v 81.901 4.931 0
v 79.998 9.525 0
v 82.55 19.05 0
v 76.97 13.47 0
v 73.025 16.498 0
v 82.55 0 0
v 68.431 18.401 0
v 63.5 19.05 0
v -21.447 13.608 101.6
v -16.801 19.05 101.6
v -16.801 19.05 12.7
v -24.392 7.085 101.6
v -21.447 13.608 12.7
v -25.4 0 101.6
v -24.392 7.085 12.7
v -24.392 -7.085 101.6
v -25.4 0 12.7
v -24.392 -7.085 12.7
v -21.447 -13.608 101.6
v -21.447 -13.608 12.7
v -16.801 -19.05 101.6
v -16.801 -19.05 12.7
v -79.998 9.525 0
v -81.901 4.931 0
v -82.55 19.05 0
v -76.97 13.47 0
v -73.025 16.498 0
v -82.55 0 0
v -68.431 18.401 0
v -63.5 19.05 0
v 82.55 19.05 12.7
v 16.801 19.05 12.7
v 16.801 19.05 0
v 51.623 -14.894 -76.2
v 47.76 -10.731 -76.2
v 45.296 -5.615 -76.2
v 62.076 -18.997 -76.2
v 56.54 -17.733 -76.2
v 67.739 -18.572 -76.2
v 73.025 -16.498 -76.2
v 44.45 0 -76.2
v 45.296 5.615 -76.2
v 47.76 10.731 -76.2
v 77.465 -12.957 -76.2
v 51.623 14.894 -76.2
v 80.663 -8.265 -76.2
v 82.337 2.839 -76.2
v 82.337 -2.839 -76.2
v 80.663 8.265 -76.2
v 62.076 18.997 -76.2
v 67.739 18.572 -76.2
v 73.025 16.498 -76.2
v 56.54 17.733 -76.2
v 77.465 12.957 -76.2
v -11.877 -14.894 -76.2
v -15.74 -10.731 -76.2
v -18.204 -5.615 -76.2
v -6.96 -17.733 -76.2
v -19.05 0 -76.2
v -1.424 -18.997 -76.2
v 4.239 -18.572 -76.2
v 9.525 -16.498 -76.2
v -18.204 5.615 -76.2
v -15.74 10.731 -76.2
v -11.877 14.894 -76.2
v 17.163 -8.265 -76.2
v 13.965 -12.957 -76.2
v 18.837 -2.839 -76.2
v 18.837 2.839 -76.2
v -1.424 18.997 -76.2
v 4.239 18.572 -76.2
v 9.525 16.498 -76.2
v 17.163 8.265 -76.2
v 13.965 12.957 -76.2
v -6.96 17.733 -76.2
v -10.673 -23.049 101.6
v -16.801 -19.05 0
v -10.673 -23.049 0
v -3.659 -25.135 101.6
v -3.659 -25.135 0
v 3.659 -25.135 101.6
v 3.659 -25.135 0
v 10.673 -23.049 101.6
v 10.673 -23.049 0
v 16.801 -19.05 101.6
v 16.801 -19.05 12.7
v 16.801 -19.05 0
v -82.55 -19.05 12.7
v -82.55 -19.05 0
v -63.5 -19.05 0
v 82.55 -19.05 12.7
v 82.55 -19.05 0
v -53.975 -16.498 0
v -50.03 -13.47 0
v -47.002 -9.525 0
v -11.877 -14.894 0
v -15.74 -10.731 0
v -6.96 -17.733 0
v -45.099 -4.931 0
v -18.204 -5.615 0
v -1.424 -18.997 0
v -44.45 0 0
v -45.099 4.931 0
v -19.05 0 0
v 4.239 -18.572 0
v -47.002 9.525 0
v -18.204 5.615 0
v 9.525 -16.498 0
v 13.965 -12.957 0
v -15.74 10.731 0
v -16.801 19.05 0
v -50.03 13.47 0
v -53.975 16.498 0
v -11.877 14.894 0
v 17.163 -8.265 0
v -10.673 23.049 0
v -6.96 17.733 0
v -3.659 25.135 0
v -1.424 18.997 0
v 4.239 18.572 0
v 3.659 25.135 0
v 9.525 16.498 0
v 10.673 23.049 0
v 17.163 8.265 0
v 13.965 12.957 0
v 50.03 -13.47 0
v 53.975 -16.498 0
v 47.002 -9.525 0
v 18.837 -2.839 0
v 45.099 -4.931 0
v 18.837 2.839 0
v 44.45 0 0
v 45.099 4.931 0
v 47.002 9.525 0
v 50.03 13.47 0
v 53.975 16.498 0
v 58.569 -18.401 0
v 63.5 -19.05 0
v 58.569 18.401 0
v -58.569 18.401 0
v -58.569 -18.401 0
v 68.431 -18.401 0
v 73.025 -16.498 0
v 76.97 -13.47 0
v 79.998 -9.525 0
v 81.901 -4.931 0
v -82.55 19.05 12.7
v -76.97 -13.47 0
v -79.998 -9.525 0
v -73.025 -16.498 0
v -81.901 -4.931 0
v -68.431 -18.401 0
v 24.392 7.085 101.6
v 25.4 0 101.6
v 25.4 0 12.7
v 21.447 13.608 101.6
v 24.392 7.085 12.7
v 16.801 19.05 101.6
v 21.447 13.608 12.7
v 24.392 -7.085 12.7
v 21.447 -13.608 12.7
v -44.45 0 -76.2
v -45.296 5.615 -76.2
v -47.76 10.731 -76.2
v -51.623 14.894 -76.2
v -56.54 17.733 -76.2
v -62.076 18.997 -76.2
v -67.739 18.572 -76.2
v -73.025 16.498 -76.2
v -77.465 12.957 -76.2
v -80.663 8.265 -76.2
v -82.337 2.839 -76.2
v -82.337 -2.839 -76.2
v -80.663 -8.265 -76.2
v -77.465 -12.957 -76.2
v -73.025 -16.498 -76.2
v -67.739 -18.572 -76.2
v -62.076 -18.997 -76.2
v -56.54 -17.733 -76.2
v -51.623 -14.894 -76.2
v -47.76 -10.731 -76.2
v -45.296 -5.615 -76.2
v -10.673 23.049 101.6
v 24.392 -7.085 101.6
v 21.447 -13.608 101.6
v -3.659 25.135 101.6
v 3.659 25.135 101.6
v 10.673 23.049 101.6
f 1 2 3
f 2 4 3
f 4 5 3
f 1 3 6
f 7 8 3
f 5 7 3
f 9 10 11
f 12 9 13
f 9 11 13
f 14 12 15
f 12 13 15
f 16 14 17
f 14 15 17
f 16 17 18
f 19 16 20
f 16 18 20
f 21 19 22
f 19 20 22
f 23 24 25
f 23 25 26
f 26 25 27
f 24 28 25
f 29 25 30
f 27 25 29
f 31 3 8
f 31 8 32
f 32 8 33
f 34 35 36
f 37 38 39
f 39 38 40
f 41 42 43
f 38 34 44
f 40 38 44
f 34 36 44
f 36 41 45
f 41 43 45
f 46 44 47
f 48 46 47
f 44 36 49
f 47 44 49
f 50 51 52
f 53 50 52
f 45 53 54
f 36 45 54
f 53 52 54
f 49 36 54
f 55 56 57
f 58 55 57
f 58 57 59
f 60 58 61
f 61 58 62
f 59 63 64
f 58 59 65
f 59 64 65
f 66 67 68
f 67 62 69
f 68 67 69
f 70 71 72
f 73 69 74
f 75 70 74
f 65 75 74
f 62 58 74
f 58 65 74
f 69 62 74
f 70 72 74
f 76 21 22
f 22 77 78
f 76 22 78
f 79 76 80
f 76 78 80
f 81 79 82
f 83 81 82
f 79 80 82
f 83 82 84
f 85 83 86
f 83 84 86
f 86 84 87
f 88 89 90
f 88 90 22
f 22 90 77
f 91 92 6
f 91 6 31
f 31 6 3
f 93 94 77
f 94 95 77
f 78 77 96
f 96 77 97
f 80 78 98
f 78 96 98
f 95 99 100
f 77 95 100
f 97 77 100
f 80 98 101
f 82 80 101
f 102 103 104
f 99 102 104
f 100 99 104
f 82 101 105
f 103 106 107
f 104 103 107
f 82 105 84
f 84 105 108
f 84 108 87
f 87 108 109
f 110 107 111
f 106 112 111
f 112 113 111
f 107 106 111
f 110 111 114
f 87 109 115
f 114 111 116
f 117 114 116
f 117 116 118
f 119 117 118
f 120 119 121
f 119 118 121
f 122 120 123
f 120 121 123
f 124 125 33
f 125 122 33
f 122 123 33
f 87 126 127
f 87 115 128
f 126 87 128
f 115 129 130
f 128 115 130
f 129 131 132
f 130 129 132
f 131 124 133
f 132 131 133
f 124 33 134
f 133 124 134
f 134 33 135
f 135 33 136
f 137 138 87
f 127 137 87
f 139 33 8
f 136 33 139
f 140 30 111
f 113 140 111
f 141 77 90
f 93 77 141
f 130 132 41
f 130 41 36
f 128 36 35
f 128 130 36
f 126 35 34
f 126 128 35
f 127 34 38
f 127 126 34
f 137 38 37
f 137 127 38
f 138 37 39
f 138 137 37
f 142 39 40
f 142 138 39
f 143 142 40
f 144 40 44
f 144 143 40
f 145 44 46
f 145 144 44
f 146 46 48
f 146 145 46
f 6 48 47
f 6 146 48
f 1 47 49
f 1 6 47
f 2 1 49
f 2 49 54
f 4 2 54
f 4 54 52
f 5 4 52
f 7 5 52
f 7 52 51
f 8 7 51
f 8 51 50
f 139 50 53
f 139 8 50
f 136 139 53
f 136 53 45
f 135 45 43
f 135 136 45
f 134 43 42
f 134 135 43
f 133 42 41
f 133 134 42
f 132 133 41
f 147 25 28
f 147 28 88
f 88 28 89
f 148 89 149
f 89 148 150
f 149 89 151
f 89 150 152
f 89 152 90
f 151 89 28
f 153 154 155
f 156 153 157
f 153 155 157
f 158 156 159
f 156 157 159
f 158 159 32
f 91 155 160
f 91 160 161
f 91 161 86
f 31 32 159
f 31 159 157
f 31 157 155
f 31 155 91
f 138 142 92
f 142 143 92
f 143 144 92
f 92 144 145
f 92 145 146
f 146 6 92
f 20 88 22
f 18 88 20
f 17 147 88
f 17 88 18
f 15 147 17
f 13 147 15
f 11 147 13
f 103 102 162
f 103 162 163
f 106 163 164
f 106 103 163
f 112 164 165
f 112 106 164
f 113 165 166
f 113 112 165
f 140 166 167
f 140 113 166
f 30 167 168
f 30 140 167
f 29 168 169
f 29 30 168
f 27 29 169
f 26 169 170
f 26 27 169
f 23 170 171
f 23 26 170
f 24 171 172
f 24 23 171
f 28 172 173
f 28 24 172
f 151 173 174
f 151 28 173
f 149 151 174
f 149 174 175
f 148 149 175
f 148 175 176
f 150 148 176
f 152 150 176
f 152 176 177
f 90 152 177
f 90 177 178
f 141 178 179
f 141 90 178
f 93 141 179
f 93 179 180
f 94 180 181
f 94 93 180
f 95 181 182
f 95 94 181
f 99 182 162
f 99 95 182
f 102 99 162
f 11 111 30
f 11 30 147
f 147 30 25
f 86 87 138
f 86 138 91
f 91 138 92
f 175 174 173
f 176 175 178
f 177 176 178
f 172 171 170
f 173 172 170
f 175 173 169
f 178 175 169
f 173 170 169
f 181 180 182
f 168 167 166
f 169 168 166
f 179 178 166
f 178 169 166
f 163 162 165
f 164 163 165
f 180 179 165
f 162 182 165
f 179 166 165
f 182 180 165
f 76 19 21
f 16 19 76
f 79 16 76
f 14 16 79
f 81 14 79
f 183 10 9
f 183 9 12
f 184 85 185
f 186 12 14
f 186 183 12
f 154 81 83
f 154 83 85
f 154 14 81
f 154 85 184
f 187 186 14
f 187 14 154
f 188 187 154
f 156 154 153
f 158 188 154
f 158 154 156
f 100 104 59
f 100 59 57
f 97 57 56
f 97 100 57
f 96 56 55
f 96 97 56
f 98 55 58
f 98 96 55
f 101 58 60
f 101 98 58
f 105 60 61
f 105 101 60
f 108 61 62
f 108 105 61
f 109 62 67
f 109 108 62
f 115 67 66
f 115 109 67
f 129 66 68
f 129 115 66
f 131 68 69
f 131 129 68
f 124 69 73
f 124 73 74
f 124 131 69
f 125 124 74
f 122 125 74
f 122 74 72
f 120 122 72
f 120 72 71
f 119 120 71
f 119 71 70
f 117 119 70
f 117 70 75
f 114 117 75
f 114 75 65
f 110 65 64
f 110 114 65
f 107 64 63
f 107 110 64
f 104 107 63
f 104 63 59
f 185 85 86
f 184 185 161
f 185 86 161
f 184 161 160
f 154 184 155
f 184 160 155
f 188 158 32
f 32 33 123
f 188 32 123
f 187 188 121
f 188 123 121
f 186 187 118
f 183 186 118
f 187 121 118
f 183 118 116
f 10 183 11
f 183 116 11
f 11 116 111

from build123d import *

# Parameters (mm, degrees)
F1_DEPTH = 101.6
F2_DEPTH = 12.7
F4_DEPTH = 76.2


with BuildPart() as f1:
    # F0 (on Top) → F1 (new body)
    with BuildSketch(Plane.XY):
        with BuildLine():
            ThreePointArc((-16.8005208253, -19.05), (0, -25.4), (16.8005208253, -19.05))
            Line((16.8005208253, -19.05), (-16.8005208253, -19.05))
        make_face()
        with BuildLine():
            ThreePointArc((25.4, 0), (23.1505208253, 10.4505208253), (16.8005208253, 19.05))
            Line((16.8005208253, 19.05), (-16.8005208253, 19.05))
            ThreePointArc((-16.8005208253, 19.05), (-25.4, 0), (-16.8005208253, -19.05))
            Line((-16.8005208253, -19.05), (16.8005208253, -19.05))
            ThreePointArc((16.8005208253, -19.05), (23.1505208253, -10.4505208253), (25.4, 0))
        make_face()
        with BuildLine():
            Line((-16.8005208253, 19.05), (16.8005208253, 19.05))
            ThreePointArc((16.8005208253, 19.05), (0, 25.4), (-16.8005208253, 19.05))
        make_face()
    extrude(amount=F1_DEPTH)

    # F0 (on Top) → F2 (join)
    with BuildSketch(Plane.XY):
        with BuildLine():
            Line((82.55, -19.05), (82.55, 19.05))
            Line((82.55, 19.05), (16.8005208253, 19.05))
            ThreePointArc((16.8005208253, 19.05), (23.1505208253, 10.4505208253), (25.4, 0))
            ThreePointArc((25.4, 0), (23.1505208253, -10.4505208253), (16.8005208253, -19.05))
            Line((16.8005208253, -19.05), (82.55, -19.05))
        make_face()
        with BuildLine():
            ThreePointArc((25.4, 0), (23.1505208253, 10.4505208253), (16.8005208253, 19.05))
            Line((16.8005208253, 19.05), (-16.8005208253, 19.05))
            ThreePointArc((-16.8005208253, 19.05), (-25.4, 0), (-16.8005208253, -19.05))
            Line((-16.8005208253, -19.05), (16.8005208253, -19.05))
            ThreePointArc((16.8005208253, -19.05), (23.1505208253, -10.4505208253), (25.4, 0))
        make_face()
        with BuildLine():
            Line((-16.8005208253, 19.05), (16.8005208253, 19.05))
            ThreePointArc((16.8005208253, 19.05), (0, 25.4), (-16.8005208253, 19.05))
        make_face()
        with BuildLine():
            ThreePointArc((-16.8005208253, -19.05), (-25.4, 0), (-16.8005208253, 19.05))
            Line((-16.8005208253, 19.05), (-82.55, 19.05))
            Line((-82.55, 19.05), (-82.55, -19.05))
            Line((-82.55, -19.05), (-16.8005208253, -19.05))
        make_face()
        with BuildLine():
            ThreePointArc((-16.8005208253, -19.05), (0, -25.4), (16.8005208253, -19.05))
            Line((16.8005208253, -19.05), (-16.8005208253, -19.05))
        make_face()
    extrude(amount=F2_DEPTH)

    # F3 (on Top) → F4 (join)
    with BuildSketch(Plane.XY):
        with BuildLine():
            Line((0, 0), (19.05, 0))
            ThreePointArc((19.05, 0), (0, 19.05), (-19.05, 0))
            Line((-19.05, 0), (0, 0))
        make_face()
        with BuildLine():
            ThreePointArc((-82.55, 0), (-63.5, -19.05), (-44.45, 0))
            Line((-44.45, 0), (-63.5, 0))
            Line((-63.5, 0), (-82.55, 0))
        make_face()
        with BuildLine():
            Line((-63.5, 0), (-44.45, 0))
            ThreePointArc((-44.45, 0), (-63.5, 19.05), (-82.55, 0))
            Line((-82.55, 0), (-63.5, 0))
        make_face()
        with BuildLine():
            ThreePointArc((-19.05, 0), (0, -19.05), (19.05, 0))
            Line((19.05, 0), (0, 0))
            Line((0, 0), (-19.05, 0))
        make_face()
        with BuildLine():
            ThreePointArc((82.55, 0), (63.5, 19.05), (44.45, 0))
            Line((44.45, 0), (63.5, 0))
            Line((63.5, 0), (82.55, 0))
        make_face()
        with BuildLine():
            Line((63.5, 0), (44.45, 0))
            ThreePointArc((44.45, 0), (63.5, -19.05), (82.55, 0))
            Line((82.55, 0), (63.5, 0))
        make_face()
    extrude(amount=-F4_DEPTH)


solid = f1.part
